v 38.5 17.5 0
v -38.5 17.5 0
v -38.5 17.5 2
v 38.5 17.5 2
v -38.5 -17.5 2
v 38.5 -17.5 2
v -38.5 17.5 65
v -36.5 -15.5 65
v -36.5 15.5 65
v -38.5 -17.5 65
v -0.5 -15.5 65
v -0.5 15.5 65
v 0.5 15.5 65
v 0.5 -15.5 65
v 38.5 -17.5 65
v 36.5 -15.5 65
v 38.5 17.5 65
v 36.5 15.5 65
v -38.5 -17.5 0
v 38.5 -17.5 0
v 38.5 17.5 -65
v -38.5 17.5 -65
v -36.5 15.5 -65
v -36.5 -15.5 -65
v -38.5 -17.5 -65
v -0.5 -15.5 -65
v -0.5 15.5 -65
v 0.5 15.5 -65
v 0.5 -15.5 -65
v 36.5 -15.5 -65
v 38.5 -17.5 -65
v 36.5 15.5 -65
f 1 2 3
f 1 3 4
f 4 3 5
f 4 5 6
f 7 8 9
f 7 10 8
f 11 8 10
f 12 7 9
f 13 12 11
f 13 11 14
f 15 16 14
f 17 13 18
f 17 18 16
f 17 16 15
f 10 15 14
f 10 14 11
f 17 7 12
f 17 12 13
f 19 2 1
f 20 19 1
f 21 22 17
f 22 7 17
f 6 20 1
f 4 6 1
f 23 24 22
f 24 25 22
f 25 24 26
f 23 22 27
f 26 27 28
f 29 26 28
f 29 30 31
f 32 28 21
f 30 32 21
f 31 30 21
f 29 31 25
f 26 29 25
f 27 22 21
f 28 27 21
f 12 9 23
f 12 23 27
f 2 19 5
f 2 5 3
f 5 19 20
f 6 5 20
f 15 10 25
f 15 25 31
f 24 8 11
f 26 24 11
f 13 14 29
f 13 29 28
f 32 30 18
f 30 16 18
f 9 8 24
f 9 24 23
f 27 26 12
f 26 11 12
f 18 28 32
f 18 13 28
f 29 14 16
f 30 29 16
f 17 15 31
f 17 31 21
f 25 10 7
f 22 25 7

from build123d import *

# Parameters (mm, degrees)
F0_W     = 77
F0_H     = 35
F0_W_2   = 36
F0_H_2   = 31
F1_DEPTH = 65
F2_DEPTH = 2


with BuildPart() as f1:
    # F0 (on Top) → F1 (new body, symmetric)
    with BuildSketch(Plane.XY):
        Rectangle(F0_W, F0_H)
        with Locations((-18.5, 0)):
            Rectangle(F0_W_2, F0_H_2, mode=Mode.SUBTRACT)
        with Locations((18.5, 0)):
            Rectangle(F0_W_2, F0_H_2, mode=Mode.SUBTRACT)
    extrude(amount=F1_DEPTH, both=True)


with BuildPart() as f2:
    # F0 (on Top) → F2 (new body)
    with BuildSketch(Plane.XY):
        Rectangle(F0_W, F0_H)
        with Locations((-18.5, 0)):
            Rectangle(F0_W_2, F0_H_2, mode=Mode.SUBTRACT)
        with Locations((18.5, 0)):
            Rectangle(F0_W_2, F0_H_2, mode=Mode.SUBTRACT)
        with Locations((18.5, 0)):
            Rectangle(F0_W_2, F0_H_2)
        with Locations((-18.5, 0)):
            Rectangle(F0_W_2, F0_H_2)
    extrude(amount=F2_DEPTH)


solid = Compound([f1.part, f2.part])
